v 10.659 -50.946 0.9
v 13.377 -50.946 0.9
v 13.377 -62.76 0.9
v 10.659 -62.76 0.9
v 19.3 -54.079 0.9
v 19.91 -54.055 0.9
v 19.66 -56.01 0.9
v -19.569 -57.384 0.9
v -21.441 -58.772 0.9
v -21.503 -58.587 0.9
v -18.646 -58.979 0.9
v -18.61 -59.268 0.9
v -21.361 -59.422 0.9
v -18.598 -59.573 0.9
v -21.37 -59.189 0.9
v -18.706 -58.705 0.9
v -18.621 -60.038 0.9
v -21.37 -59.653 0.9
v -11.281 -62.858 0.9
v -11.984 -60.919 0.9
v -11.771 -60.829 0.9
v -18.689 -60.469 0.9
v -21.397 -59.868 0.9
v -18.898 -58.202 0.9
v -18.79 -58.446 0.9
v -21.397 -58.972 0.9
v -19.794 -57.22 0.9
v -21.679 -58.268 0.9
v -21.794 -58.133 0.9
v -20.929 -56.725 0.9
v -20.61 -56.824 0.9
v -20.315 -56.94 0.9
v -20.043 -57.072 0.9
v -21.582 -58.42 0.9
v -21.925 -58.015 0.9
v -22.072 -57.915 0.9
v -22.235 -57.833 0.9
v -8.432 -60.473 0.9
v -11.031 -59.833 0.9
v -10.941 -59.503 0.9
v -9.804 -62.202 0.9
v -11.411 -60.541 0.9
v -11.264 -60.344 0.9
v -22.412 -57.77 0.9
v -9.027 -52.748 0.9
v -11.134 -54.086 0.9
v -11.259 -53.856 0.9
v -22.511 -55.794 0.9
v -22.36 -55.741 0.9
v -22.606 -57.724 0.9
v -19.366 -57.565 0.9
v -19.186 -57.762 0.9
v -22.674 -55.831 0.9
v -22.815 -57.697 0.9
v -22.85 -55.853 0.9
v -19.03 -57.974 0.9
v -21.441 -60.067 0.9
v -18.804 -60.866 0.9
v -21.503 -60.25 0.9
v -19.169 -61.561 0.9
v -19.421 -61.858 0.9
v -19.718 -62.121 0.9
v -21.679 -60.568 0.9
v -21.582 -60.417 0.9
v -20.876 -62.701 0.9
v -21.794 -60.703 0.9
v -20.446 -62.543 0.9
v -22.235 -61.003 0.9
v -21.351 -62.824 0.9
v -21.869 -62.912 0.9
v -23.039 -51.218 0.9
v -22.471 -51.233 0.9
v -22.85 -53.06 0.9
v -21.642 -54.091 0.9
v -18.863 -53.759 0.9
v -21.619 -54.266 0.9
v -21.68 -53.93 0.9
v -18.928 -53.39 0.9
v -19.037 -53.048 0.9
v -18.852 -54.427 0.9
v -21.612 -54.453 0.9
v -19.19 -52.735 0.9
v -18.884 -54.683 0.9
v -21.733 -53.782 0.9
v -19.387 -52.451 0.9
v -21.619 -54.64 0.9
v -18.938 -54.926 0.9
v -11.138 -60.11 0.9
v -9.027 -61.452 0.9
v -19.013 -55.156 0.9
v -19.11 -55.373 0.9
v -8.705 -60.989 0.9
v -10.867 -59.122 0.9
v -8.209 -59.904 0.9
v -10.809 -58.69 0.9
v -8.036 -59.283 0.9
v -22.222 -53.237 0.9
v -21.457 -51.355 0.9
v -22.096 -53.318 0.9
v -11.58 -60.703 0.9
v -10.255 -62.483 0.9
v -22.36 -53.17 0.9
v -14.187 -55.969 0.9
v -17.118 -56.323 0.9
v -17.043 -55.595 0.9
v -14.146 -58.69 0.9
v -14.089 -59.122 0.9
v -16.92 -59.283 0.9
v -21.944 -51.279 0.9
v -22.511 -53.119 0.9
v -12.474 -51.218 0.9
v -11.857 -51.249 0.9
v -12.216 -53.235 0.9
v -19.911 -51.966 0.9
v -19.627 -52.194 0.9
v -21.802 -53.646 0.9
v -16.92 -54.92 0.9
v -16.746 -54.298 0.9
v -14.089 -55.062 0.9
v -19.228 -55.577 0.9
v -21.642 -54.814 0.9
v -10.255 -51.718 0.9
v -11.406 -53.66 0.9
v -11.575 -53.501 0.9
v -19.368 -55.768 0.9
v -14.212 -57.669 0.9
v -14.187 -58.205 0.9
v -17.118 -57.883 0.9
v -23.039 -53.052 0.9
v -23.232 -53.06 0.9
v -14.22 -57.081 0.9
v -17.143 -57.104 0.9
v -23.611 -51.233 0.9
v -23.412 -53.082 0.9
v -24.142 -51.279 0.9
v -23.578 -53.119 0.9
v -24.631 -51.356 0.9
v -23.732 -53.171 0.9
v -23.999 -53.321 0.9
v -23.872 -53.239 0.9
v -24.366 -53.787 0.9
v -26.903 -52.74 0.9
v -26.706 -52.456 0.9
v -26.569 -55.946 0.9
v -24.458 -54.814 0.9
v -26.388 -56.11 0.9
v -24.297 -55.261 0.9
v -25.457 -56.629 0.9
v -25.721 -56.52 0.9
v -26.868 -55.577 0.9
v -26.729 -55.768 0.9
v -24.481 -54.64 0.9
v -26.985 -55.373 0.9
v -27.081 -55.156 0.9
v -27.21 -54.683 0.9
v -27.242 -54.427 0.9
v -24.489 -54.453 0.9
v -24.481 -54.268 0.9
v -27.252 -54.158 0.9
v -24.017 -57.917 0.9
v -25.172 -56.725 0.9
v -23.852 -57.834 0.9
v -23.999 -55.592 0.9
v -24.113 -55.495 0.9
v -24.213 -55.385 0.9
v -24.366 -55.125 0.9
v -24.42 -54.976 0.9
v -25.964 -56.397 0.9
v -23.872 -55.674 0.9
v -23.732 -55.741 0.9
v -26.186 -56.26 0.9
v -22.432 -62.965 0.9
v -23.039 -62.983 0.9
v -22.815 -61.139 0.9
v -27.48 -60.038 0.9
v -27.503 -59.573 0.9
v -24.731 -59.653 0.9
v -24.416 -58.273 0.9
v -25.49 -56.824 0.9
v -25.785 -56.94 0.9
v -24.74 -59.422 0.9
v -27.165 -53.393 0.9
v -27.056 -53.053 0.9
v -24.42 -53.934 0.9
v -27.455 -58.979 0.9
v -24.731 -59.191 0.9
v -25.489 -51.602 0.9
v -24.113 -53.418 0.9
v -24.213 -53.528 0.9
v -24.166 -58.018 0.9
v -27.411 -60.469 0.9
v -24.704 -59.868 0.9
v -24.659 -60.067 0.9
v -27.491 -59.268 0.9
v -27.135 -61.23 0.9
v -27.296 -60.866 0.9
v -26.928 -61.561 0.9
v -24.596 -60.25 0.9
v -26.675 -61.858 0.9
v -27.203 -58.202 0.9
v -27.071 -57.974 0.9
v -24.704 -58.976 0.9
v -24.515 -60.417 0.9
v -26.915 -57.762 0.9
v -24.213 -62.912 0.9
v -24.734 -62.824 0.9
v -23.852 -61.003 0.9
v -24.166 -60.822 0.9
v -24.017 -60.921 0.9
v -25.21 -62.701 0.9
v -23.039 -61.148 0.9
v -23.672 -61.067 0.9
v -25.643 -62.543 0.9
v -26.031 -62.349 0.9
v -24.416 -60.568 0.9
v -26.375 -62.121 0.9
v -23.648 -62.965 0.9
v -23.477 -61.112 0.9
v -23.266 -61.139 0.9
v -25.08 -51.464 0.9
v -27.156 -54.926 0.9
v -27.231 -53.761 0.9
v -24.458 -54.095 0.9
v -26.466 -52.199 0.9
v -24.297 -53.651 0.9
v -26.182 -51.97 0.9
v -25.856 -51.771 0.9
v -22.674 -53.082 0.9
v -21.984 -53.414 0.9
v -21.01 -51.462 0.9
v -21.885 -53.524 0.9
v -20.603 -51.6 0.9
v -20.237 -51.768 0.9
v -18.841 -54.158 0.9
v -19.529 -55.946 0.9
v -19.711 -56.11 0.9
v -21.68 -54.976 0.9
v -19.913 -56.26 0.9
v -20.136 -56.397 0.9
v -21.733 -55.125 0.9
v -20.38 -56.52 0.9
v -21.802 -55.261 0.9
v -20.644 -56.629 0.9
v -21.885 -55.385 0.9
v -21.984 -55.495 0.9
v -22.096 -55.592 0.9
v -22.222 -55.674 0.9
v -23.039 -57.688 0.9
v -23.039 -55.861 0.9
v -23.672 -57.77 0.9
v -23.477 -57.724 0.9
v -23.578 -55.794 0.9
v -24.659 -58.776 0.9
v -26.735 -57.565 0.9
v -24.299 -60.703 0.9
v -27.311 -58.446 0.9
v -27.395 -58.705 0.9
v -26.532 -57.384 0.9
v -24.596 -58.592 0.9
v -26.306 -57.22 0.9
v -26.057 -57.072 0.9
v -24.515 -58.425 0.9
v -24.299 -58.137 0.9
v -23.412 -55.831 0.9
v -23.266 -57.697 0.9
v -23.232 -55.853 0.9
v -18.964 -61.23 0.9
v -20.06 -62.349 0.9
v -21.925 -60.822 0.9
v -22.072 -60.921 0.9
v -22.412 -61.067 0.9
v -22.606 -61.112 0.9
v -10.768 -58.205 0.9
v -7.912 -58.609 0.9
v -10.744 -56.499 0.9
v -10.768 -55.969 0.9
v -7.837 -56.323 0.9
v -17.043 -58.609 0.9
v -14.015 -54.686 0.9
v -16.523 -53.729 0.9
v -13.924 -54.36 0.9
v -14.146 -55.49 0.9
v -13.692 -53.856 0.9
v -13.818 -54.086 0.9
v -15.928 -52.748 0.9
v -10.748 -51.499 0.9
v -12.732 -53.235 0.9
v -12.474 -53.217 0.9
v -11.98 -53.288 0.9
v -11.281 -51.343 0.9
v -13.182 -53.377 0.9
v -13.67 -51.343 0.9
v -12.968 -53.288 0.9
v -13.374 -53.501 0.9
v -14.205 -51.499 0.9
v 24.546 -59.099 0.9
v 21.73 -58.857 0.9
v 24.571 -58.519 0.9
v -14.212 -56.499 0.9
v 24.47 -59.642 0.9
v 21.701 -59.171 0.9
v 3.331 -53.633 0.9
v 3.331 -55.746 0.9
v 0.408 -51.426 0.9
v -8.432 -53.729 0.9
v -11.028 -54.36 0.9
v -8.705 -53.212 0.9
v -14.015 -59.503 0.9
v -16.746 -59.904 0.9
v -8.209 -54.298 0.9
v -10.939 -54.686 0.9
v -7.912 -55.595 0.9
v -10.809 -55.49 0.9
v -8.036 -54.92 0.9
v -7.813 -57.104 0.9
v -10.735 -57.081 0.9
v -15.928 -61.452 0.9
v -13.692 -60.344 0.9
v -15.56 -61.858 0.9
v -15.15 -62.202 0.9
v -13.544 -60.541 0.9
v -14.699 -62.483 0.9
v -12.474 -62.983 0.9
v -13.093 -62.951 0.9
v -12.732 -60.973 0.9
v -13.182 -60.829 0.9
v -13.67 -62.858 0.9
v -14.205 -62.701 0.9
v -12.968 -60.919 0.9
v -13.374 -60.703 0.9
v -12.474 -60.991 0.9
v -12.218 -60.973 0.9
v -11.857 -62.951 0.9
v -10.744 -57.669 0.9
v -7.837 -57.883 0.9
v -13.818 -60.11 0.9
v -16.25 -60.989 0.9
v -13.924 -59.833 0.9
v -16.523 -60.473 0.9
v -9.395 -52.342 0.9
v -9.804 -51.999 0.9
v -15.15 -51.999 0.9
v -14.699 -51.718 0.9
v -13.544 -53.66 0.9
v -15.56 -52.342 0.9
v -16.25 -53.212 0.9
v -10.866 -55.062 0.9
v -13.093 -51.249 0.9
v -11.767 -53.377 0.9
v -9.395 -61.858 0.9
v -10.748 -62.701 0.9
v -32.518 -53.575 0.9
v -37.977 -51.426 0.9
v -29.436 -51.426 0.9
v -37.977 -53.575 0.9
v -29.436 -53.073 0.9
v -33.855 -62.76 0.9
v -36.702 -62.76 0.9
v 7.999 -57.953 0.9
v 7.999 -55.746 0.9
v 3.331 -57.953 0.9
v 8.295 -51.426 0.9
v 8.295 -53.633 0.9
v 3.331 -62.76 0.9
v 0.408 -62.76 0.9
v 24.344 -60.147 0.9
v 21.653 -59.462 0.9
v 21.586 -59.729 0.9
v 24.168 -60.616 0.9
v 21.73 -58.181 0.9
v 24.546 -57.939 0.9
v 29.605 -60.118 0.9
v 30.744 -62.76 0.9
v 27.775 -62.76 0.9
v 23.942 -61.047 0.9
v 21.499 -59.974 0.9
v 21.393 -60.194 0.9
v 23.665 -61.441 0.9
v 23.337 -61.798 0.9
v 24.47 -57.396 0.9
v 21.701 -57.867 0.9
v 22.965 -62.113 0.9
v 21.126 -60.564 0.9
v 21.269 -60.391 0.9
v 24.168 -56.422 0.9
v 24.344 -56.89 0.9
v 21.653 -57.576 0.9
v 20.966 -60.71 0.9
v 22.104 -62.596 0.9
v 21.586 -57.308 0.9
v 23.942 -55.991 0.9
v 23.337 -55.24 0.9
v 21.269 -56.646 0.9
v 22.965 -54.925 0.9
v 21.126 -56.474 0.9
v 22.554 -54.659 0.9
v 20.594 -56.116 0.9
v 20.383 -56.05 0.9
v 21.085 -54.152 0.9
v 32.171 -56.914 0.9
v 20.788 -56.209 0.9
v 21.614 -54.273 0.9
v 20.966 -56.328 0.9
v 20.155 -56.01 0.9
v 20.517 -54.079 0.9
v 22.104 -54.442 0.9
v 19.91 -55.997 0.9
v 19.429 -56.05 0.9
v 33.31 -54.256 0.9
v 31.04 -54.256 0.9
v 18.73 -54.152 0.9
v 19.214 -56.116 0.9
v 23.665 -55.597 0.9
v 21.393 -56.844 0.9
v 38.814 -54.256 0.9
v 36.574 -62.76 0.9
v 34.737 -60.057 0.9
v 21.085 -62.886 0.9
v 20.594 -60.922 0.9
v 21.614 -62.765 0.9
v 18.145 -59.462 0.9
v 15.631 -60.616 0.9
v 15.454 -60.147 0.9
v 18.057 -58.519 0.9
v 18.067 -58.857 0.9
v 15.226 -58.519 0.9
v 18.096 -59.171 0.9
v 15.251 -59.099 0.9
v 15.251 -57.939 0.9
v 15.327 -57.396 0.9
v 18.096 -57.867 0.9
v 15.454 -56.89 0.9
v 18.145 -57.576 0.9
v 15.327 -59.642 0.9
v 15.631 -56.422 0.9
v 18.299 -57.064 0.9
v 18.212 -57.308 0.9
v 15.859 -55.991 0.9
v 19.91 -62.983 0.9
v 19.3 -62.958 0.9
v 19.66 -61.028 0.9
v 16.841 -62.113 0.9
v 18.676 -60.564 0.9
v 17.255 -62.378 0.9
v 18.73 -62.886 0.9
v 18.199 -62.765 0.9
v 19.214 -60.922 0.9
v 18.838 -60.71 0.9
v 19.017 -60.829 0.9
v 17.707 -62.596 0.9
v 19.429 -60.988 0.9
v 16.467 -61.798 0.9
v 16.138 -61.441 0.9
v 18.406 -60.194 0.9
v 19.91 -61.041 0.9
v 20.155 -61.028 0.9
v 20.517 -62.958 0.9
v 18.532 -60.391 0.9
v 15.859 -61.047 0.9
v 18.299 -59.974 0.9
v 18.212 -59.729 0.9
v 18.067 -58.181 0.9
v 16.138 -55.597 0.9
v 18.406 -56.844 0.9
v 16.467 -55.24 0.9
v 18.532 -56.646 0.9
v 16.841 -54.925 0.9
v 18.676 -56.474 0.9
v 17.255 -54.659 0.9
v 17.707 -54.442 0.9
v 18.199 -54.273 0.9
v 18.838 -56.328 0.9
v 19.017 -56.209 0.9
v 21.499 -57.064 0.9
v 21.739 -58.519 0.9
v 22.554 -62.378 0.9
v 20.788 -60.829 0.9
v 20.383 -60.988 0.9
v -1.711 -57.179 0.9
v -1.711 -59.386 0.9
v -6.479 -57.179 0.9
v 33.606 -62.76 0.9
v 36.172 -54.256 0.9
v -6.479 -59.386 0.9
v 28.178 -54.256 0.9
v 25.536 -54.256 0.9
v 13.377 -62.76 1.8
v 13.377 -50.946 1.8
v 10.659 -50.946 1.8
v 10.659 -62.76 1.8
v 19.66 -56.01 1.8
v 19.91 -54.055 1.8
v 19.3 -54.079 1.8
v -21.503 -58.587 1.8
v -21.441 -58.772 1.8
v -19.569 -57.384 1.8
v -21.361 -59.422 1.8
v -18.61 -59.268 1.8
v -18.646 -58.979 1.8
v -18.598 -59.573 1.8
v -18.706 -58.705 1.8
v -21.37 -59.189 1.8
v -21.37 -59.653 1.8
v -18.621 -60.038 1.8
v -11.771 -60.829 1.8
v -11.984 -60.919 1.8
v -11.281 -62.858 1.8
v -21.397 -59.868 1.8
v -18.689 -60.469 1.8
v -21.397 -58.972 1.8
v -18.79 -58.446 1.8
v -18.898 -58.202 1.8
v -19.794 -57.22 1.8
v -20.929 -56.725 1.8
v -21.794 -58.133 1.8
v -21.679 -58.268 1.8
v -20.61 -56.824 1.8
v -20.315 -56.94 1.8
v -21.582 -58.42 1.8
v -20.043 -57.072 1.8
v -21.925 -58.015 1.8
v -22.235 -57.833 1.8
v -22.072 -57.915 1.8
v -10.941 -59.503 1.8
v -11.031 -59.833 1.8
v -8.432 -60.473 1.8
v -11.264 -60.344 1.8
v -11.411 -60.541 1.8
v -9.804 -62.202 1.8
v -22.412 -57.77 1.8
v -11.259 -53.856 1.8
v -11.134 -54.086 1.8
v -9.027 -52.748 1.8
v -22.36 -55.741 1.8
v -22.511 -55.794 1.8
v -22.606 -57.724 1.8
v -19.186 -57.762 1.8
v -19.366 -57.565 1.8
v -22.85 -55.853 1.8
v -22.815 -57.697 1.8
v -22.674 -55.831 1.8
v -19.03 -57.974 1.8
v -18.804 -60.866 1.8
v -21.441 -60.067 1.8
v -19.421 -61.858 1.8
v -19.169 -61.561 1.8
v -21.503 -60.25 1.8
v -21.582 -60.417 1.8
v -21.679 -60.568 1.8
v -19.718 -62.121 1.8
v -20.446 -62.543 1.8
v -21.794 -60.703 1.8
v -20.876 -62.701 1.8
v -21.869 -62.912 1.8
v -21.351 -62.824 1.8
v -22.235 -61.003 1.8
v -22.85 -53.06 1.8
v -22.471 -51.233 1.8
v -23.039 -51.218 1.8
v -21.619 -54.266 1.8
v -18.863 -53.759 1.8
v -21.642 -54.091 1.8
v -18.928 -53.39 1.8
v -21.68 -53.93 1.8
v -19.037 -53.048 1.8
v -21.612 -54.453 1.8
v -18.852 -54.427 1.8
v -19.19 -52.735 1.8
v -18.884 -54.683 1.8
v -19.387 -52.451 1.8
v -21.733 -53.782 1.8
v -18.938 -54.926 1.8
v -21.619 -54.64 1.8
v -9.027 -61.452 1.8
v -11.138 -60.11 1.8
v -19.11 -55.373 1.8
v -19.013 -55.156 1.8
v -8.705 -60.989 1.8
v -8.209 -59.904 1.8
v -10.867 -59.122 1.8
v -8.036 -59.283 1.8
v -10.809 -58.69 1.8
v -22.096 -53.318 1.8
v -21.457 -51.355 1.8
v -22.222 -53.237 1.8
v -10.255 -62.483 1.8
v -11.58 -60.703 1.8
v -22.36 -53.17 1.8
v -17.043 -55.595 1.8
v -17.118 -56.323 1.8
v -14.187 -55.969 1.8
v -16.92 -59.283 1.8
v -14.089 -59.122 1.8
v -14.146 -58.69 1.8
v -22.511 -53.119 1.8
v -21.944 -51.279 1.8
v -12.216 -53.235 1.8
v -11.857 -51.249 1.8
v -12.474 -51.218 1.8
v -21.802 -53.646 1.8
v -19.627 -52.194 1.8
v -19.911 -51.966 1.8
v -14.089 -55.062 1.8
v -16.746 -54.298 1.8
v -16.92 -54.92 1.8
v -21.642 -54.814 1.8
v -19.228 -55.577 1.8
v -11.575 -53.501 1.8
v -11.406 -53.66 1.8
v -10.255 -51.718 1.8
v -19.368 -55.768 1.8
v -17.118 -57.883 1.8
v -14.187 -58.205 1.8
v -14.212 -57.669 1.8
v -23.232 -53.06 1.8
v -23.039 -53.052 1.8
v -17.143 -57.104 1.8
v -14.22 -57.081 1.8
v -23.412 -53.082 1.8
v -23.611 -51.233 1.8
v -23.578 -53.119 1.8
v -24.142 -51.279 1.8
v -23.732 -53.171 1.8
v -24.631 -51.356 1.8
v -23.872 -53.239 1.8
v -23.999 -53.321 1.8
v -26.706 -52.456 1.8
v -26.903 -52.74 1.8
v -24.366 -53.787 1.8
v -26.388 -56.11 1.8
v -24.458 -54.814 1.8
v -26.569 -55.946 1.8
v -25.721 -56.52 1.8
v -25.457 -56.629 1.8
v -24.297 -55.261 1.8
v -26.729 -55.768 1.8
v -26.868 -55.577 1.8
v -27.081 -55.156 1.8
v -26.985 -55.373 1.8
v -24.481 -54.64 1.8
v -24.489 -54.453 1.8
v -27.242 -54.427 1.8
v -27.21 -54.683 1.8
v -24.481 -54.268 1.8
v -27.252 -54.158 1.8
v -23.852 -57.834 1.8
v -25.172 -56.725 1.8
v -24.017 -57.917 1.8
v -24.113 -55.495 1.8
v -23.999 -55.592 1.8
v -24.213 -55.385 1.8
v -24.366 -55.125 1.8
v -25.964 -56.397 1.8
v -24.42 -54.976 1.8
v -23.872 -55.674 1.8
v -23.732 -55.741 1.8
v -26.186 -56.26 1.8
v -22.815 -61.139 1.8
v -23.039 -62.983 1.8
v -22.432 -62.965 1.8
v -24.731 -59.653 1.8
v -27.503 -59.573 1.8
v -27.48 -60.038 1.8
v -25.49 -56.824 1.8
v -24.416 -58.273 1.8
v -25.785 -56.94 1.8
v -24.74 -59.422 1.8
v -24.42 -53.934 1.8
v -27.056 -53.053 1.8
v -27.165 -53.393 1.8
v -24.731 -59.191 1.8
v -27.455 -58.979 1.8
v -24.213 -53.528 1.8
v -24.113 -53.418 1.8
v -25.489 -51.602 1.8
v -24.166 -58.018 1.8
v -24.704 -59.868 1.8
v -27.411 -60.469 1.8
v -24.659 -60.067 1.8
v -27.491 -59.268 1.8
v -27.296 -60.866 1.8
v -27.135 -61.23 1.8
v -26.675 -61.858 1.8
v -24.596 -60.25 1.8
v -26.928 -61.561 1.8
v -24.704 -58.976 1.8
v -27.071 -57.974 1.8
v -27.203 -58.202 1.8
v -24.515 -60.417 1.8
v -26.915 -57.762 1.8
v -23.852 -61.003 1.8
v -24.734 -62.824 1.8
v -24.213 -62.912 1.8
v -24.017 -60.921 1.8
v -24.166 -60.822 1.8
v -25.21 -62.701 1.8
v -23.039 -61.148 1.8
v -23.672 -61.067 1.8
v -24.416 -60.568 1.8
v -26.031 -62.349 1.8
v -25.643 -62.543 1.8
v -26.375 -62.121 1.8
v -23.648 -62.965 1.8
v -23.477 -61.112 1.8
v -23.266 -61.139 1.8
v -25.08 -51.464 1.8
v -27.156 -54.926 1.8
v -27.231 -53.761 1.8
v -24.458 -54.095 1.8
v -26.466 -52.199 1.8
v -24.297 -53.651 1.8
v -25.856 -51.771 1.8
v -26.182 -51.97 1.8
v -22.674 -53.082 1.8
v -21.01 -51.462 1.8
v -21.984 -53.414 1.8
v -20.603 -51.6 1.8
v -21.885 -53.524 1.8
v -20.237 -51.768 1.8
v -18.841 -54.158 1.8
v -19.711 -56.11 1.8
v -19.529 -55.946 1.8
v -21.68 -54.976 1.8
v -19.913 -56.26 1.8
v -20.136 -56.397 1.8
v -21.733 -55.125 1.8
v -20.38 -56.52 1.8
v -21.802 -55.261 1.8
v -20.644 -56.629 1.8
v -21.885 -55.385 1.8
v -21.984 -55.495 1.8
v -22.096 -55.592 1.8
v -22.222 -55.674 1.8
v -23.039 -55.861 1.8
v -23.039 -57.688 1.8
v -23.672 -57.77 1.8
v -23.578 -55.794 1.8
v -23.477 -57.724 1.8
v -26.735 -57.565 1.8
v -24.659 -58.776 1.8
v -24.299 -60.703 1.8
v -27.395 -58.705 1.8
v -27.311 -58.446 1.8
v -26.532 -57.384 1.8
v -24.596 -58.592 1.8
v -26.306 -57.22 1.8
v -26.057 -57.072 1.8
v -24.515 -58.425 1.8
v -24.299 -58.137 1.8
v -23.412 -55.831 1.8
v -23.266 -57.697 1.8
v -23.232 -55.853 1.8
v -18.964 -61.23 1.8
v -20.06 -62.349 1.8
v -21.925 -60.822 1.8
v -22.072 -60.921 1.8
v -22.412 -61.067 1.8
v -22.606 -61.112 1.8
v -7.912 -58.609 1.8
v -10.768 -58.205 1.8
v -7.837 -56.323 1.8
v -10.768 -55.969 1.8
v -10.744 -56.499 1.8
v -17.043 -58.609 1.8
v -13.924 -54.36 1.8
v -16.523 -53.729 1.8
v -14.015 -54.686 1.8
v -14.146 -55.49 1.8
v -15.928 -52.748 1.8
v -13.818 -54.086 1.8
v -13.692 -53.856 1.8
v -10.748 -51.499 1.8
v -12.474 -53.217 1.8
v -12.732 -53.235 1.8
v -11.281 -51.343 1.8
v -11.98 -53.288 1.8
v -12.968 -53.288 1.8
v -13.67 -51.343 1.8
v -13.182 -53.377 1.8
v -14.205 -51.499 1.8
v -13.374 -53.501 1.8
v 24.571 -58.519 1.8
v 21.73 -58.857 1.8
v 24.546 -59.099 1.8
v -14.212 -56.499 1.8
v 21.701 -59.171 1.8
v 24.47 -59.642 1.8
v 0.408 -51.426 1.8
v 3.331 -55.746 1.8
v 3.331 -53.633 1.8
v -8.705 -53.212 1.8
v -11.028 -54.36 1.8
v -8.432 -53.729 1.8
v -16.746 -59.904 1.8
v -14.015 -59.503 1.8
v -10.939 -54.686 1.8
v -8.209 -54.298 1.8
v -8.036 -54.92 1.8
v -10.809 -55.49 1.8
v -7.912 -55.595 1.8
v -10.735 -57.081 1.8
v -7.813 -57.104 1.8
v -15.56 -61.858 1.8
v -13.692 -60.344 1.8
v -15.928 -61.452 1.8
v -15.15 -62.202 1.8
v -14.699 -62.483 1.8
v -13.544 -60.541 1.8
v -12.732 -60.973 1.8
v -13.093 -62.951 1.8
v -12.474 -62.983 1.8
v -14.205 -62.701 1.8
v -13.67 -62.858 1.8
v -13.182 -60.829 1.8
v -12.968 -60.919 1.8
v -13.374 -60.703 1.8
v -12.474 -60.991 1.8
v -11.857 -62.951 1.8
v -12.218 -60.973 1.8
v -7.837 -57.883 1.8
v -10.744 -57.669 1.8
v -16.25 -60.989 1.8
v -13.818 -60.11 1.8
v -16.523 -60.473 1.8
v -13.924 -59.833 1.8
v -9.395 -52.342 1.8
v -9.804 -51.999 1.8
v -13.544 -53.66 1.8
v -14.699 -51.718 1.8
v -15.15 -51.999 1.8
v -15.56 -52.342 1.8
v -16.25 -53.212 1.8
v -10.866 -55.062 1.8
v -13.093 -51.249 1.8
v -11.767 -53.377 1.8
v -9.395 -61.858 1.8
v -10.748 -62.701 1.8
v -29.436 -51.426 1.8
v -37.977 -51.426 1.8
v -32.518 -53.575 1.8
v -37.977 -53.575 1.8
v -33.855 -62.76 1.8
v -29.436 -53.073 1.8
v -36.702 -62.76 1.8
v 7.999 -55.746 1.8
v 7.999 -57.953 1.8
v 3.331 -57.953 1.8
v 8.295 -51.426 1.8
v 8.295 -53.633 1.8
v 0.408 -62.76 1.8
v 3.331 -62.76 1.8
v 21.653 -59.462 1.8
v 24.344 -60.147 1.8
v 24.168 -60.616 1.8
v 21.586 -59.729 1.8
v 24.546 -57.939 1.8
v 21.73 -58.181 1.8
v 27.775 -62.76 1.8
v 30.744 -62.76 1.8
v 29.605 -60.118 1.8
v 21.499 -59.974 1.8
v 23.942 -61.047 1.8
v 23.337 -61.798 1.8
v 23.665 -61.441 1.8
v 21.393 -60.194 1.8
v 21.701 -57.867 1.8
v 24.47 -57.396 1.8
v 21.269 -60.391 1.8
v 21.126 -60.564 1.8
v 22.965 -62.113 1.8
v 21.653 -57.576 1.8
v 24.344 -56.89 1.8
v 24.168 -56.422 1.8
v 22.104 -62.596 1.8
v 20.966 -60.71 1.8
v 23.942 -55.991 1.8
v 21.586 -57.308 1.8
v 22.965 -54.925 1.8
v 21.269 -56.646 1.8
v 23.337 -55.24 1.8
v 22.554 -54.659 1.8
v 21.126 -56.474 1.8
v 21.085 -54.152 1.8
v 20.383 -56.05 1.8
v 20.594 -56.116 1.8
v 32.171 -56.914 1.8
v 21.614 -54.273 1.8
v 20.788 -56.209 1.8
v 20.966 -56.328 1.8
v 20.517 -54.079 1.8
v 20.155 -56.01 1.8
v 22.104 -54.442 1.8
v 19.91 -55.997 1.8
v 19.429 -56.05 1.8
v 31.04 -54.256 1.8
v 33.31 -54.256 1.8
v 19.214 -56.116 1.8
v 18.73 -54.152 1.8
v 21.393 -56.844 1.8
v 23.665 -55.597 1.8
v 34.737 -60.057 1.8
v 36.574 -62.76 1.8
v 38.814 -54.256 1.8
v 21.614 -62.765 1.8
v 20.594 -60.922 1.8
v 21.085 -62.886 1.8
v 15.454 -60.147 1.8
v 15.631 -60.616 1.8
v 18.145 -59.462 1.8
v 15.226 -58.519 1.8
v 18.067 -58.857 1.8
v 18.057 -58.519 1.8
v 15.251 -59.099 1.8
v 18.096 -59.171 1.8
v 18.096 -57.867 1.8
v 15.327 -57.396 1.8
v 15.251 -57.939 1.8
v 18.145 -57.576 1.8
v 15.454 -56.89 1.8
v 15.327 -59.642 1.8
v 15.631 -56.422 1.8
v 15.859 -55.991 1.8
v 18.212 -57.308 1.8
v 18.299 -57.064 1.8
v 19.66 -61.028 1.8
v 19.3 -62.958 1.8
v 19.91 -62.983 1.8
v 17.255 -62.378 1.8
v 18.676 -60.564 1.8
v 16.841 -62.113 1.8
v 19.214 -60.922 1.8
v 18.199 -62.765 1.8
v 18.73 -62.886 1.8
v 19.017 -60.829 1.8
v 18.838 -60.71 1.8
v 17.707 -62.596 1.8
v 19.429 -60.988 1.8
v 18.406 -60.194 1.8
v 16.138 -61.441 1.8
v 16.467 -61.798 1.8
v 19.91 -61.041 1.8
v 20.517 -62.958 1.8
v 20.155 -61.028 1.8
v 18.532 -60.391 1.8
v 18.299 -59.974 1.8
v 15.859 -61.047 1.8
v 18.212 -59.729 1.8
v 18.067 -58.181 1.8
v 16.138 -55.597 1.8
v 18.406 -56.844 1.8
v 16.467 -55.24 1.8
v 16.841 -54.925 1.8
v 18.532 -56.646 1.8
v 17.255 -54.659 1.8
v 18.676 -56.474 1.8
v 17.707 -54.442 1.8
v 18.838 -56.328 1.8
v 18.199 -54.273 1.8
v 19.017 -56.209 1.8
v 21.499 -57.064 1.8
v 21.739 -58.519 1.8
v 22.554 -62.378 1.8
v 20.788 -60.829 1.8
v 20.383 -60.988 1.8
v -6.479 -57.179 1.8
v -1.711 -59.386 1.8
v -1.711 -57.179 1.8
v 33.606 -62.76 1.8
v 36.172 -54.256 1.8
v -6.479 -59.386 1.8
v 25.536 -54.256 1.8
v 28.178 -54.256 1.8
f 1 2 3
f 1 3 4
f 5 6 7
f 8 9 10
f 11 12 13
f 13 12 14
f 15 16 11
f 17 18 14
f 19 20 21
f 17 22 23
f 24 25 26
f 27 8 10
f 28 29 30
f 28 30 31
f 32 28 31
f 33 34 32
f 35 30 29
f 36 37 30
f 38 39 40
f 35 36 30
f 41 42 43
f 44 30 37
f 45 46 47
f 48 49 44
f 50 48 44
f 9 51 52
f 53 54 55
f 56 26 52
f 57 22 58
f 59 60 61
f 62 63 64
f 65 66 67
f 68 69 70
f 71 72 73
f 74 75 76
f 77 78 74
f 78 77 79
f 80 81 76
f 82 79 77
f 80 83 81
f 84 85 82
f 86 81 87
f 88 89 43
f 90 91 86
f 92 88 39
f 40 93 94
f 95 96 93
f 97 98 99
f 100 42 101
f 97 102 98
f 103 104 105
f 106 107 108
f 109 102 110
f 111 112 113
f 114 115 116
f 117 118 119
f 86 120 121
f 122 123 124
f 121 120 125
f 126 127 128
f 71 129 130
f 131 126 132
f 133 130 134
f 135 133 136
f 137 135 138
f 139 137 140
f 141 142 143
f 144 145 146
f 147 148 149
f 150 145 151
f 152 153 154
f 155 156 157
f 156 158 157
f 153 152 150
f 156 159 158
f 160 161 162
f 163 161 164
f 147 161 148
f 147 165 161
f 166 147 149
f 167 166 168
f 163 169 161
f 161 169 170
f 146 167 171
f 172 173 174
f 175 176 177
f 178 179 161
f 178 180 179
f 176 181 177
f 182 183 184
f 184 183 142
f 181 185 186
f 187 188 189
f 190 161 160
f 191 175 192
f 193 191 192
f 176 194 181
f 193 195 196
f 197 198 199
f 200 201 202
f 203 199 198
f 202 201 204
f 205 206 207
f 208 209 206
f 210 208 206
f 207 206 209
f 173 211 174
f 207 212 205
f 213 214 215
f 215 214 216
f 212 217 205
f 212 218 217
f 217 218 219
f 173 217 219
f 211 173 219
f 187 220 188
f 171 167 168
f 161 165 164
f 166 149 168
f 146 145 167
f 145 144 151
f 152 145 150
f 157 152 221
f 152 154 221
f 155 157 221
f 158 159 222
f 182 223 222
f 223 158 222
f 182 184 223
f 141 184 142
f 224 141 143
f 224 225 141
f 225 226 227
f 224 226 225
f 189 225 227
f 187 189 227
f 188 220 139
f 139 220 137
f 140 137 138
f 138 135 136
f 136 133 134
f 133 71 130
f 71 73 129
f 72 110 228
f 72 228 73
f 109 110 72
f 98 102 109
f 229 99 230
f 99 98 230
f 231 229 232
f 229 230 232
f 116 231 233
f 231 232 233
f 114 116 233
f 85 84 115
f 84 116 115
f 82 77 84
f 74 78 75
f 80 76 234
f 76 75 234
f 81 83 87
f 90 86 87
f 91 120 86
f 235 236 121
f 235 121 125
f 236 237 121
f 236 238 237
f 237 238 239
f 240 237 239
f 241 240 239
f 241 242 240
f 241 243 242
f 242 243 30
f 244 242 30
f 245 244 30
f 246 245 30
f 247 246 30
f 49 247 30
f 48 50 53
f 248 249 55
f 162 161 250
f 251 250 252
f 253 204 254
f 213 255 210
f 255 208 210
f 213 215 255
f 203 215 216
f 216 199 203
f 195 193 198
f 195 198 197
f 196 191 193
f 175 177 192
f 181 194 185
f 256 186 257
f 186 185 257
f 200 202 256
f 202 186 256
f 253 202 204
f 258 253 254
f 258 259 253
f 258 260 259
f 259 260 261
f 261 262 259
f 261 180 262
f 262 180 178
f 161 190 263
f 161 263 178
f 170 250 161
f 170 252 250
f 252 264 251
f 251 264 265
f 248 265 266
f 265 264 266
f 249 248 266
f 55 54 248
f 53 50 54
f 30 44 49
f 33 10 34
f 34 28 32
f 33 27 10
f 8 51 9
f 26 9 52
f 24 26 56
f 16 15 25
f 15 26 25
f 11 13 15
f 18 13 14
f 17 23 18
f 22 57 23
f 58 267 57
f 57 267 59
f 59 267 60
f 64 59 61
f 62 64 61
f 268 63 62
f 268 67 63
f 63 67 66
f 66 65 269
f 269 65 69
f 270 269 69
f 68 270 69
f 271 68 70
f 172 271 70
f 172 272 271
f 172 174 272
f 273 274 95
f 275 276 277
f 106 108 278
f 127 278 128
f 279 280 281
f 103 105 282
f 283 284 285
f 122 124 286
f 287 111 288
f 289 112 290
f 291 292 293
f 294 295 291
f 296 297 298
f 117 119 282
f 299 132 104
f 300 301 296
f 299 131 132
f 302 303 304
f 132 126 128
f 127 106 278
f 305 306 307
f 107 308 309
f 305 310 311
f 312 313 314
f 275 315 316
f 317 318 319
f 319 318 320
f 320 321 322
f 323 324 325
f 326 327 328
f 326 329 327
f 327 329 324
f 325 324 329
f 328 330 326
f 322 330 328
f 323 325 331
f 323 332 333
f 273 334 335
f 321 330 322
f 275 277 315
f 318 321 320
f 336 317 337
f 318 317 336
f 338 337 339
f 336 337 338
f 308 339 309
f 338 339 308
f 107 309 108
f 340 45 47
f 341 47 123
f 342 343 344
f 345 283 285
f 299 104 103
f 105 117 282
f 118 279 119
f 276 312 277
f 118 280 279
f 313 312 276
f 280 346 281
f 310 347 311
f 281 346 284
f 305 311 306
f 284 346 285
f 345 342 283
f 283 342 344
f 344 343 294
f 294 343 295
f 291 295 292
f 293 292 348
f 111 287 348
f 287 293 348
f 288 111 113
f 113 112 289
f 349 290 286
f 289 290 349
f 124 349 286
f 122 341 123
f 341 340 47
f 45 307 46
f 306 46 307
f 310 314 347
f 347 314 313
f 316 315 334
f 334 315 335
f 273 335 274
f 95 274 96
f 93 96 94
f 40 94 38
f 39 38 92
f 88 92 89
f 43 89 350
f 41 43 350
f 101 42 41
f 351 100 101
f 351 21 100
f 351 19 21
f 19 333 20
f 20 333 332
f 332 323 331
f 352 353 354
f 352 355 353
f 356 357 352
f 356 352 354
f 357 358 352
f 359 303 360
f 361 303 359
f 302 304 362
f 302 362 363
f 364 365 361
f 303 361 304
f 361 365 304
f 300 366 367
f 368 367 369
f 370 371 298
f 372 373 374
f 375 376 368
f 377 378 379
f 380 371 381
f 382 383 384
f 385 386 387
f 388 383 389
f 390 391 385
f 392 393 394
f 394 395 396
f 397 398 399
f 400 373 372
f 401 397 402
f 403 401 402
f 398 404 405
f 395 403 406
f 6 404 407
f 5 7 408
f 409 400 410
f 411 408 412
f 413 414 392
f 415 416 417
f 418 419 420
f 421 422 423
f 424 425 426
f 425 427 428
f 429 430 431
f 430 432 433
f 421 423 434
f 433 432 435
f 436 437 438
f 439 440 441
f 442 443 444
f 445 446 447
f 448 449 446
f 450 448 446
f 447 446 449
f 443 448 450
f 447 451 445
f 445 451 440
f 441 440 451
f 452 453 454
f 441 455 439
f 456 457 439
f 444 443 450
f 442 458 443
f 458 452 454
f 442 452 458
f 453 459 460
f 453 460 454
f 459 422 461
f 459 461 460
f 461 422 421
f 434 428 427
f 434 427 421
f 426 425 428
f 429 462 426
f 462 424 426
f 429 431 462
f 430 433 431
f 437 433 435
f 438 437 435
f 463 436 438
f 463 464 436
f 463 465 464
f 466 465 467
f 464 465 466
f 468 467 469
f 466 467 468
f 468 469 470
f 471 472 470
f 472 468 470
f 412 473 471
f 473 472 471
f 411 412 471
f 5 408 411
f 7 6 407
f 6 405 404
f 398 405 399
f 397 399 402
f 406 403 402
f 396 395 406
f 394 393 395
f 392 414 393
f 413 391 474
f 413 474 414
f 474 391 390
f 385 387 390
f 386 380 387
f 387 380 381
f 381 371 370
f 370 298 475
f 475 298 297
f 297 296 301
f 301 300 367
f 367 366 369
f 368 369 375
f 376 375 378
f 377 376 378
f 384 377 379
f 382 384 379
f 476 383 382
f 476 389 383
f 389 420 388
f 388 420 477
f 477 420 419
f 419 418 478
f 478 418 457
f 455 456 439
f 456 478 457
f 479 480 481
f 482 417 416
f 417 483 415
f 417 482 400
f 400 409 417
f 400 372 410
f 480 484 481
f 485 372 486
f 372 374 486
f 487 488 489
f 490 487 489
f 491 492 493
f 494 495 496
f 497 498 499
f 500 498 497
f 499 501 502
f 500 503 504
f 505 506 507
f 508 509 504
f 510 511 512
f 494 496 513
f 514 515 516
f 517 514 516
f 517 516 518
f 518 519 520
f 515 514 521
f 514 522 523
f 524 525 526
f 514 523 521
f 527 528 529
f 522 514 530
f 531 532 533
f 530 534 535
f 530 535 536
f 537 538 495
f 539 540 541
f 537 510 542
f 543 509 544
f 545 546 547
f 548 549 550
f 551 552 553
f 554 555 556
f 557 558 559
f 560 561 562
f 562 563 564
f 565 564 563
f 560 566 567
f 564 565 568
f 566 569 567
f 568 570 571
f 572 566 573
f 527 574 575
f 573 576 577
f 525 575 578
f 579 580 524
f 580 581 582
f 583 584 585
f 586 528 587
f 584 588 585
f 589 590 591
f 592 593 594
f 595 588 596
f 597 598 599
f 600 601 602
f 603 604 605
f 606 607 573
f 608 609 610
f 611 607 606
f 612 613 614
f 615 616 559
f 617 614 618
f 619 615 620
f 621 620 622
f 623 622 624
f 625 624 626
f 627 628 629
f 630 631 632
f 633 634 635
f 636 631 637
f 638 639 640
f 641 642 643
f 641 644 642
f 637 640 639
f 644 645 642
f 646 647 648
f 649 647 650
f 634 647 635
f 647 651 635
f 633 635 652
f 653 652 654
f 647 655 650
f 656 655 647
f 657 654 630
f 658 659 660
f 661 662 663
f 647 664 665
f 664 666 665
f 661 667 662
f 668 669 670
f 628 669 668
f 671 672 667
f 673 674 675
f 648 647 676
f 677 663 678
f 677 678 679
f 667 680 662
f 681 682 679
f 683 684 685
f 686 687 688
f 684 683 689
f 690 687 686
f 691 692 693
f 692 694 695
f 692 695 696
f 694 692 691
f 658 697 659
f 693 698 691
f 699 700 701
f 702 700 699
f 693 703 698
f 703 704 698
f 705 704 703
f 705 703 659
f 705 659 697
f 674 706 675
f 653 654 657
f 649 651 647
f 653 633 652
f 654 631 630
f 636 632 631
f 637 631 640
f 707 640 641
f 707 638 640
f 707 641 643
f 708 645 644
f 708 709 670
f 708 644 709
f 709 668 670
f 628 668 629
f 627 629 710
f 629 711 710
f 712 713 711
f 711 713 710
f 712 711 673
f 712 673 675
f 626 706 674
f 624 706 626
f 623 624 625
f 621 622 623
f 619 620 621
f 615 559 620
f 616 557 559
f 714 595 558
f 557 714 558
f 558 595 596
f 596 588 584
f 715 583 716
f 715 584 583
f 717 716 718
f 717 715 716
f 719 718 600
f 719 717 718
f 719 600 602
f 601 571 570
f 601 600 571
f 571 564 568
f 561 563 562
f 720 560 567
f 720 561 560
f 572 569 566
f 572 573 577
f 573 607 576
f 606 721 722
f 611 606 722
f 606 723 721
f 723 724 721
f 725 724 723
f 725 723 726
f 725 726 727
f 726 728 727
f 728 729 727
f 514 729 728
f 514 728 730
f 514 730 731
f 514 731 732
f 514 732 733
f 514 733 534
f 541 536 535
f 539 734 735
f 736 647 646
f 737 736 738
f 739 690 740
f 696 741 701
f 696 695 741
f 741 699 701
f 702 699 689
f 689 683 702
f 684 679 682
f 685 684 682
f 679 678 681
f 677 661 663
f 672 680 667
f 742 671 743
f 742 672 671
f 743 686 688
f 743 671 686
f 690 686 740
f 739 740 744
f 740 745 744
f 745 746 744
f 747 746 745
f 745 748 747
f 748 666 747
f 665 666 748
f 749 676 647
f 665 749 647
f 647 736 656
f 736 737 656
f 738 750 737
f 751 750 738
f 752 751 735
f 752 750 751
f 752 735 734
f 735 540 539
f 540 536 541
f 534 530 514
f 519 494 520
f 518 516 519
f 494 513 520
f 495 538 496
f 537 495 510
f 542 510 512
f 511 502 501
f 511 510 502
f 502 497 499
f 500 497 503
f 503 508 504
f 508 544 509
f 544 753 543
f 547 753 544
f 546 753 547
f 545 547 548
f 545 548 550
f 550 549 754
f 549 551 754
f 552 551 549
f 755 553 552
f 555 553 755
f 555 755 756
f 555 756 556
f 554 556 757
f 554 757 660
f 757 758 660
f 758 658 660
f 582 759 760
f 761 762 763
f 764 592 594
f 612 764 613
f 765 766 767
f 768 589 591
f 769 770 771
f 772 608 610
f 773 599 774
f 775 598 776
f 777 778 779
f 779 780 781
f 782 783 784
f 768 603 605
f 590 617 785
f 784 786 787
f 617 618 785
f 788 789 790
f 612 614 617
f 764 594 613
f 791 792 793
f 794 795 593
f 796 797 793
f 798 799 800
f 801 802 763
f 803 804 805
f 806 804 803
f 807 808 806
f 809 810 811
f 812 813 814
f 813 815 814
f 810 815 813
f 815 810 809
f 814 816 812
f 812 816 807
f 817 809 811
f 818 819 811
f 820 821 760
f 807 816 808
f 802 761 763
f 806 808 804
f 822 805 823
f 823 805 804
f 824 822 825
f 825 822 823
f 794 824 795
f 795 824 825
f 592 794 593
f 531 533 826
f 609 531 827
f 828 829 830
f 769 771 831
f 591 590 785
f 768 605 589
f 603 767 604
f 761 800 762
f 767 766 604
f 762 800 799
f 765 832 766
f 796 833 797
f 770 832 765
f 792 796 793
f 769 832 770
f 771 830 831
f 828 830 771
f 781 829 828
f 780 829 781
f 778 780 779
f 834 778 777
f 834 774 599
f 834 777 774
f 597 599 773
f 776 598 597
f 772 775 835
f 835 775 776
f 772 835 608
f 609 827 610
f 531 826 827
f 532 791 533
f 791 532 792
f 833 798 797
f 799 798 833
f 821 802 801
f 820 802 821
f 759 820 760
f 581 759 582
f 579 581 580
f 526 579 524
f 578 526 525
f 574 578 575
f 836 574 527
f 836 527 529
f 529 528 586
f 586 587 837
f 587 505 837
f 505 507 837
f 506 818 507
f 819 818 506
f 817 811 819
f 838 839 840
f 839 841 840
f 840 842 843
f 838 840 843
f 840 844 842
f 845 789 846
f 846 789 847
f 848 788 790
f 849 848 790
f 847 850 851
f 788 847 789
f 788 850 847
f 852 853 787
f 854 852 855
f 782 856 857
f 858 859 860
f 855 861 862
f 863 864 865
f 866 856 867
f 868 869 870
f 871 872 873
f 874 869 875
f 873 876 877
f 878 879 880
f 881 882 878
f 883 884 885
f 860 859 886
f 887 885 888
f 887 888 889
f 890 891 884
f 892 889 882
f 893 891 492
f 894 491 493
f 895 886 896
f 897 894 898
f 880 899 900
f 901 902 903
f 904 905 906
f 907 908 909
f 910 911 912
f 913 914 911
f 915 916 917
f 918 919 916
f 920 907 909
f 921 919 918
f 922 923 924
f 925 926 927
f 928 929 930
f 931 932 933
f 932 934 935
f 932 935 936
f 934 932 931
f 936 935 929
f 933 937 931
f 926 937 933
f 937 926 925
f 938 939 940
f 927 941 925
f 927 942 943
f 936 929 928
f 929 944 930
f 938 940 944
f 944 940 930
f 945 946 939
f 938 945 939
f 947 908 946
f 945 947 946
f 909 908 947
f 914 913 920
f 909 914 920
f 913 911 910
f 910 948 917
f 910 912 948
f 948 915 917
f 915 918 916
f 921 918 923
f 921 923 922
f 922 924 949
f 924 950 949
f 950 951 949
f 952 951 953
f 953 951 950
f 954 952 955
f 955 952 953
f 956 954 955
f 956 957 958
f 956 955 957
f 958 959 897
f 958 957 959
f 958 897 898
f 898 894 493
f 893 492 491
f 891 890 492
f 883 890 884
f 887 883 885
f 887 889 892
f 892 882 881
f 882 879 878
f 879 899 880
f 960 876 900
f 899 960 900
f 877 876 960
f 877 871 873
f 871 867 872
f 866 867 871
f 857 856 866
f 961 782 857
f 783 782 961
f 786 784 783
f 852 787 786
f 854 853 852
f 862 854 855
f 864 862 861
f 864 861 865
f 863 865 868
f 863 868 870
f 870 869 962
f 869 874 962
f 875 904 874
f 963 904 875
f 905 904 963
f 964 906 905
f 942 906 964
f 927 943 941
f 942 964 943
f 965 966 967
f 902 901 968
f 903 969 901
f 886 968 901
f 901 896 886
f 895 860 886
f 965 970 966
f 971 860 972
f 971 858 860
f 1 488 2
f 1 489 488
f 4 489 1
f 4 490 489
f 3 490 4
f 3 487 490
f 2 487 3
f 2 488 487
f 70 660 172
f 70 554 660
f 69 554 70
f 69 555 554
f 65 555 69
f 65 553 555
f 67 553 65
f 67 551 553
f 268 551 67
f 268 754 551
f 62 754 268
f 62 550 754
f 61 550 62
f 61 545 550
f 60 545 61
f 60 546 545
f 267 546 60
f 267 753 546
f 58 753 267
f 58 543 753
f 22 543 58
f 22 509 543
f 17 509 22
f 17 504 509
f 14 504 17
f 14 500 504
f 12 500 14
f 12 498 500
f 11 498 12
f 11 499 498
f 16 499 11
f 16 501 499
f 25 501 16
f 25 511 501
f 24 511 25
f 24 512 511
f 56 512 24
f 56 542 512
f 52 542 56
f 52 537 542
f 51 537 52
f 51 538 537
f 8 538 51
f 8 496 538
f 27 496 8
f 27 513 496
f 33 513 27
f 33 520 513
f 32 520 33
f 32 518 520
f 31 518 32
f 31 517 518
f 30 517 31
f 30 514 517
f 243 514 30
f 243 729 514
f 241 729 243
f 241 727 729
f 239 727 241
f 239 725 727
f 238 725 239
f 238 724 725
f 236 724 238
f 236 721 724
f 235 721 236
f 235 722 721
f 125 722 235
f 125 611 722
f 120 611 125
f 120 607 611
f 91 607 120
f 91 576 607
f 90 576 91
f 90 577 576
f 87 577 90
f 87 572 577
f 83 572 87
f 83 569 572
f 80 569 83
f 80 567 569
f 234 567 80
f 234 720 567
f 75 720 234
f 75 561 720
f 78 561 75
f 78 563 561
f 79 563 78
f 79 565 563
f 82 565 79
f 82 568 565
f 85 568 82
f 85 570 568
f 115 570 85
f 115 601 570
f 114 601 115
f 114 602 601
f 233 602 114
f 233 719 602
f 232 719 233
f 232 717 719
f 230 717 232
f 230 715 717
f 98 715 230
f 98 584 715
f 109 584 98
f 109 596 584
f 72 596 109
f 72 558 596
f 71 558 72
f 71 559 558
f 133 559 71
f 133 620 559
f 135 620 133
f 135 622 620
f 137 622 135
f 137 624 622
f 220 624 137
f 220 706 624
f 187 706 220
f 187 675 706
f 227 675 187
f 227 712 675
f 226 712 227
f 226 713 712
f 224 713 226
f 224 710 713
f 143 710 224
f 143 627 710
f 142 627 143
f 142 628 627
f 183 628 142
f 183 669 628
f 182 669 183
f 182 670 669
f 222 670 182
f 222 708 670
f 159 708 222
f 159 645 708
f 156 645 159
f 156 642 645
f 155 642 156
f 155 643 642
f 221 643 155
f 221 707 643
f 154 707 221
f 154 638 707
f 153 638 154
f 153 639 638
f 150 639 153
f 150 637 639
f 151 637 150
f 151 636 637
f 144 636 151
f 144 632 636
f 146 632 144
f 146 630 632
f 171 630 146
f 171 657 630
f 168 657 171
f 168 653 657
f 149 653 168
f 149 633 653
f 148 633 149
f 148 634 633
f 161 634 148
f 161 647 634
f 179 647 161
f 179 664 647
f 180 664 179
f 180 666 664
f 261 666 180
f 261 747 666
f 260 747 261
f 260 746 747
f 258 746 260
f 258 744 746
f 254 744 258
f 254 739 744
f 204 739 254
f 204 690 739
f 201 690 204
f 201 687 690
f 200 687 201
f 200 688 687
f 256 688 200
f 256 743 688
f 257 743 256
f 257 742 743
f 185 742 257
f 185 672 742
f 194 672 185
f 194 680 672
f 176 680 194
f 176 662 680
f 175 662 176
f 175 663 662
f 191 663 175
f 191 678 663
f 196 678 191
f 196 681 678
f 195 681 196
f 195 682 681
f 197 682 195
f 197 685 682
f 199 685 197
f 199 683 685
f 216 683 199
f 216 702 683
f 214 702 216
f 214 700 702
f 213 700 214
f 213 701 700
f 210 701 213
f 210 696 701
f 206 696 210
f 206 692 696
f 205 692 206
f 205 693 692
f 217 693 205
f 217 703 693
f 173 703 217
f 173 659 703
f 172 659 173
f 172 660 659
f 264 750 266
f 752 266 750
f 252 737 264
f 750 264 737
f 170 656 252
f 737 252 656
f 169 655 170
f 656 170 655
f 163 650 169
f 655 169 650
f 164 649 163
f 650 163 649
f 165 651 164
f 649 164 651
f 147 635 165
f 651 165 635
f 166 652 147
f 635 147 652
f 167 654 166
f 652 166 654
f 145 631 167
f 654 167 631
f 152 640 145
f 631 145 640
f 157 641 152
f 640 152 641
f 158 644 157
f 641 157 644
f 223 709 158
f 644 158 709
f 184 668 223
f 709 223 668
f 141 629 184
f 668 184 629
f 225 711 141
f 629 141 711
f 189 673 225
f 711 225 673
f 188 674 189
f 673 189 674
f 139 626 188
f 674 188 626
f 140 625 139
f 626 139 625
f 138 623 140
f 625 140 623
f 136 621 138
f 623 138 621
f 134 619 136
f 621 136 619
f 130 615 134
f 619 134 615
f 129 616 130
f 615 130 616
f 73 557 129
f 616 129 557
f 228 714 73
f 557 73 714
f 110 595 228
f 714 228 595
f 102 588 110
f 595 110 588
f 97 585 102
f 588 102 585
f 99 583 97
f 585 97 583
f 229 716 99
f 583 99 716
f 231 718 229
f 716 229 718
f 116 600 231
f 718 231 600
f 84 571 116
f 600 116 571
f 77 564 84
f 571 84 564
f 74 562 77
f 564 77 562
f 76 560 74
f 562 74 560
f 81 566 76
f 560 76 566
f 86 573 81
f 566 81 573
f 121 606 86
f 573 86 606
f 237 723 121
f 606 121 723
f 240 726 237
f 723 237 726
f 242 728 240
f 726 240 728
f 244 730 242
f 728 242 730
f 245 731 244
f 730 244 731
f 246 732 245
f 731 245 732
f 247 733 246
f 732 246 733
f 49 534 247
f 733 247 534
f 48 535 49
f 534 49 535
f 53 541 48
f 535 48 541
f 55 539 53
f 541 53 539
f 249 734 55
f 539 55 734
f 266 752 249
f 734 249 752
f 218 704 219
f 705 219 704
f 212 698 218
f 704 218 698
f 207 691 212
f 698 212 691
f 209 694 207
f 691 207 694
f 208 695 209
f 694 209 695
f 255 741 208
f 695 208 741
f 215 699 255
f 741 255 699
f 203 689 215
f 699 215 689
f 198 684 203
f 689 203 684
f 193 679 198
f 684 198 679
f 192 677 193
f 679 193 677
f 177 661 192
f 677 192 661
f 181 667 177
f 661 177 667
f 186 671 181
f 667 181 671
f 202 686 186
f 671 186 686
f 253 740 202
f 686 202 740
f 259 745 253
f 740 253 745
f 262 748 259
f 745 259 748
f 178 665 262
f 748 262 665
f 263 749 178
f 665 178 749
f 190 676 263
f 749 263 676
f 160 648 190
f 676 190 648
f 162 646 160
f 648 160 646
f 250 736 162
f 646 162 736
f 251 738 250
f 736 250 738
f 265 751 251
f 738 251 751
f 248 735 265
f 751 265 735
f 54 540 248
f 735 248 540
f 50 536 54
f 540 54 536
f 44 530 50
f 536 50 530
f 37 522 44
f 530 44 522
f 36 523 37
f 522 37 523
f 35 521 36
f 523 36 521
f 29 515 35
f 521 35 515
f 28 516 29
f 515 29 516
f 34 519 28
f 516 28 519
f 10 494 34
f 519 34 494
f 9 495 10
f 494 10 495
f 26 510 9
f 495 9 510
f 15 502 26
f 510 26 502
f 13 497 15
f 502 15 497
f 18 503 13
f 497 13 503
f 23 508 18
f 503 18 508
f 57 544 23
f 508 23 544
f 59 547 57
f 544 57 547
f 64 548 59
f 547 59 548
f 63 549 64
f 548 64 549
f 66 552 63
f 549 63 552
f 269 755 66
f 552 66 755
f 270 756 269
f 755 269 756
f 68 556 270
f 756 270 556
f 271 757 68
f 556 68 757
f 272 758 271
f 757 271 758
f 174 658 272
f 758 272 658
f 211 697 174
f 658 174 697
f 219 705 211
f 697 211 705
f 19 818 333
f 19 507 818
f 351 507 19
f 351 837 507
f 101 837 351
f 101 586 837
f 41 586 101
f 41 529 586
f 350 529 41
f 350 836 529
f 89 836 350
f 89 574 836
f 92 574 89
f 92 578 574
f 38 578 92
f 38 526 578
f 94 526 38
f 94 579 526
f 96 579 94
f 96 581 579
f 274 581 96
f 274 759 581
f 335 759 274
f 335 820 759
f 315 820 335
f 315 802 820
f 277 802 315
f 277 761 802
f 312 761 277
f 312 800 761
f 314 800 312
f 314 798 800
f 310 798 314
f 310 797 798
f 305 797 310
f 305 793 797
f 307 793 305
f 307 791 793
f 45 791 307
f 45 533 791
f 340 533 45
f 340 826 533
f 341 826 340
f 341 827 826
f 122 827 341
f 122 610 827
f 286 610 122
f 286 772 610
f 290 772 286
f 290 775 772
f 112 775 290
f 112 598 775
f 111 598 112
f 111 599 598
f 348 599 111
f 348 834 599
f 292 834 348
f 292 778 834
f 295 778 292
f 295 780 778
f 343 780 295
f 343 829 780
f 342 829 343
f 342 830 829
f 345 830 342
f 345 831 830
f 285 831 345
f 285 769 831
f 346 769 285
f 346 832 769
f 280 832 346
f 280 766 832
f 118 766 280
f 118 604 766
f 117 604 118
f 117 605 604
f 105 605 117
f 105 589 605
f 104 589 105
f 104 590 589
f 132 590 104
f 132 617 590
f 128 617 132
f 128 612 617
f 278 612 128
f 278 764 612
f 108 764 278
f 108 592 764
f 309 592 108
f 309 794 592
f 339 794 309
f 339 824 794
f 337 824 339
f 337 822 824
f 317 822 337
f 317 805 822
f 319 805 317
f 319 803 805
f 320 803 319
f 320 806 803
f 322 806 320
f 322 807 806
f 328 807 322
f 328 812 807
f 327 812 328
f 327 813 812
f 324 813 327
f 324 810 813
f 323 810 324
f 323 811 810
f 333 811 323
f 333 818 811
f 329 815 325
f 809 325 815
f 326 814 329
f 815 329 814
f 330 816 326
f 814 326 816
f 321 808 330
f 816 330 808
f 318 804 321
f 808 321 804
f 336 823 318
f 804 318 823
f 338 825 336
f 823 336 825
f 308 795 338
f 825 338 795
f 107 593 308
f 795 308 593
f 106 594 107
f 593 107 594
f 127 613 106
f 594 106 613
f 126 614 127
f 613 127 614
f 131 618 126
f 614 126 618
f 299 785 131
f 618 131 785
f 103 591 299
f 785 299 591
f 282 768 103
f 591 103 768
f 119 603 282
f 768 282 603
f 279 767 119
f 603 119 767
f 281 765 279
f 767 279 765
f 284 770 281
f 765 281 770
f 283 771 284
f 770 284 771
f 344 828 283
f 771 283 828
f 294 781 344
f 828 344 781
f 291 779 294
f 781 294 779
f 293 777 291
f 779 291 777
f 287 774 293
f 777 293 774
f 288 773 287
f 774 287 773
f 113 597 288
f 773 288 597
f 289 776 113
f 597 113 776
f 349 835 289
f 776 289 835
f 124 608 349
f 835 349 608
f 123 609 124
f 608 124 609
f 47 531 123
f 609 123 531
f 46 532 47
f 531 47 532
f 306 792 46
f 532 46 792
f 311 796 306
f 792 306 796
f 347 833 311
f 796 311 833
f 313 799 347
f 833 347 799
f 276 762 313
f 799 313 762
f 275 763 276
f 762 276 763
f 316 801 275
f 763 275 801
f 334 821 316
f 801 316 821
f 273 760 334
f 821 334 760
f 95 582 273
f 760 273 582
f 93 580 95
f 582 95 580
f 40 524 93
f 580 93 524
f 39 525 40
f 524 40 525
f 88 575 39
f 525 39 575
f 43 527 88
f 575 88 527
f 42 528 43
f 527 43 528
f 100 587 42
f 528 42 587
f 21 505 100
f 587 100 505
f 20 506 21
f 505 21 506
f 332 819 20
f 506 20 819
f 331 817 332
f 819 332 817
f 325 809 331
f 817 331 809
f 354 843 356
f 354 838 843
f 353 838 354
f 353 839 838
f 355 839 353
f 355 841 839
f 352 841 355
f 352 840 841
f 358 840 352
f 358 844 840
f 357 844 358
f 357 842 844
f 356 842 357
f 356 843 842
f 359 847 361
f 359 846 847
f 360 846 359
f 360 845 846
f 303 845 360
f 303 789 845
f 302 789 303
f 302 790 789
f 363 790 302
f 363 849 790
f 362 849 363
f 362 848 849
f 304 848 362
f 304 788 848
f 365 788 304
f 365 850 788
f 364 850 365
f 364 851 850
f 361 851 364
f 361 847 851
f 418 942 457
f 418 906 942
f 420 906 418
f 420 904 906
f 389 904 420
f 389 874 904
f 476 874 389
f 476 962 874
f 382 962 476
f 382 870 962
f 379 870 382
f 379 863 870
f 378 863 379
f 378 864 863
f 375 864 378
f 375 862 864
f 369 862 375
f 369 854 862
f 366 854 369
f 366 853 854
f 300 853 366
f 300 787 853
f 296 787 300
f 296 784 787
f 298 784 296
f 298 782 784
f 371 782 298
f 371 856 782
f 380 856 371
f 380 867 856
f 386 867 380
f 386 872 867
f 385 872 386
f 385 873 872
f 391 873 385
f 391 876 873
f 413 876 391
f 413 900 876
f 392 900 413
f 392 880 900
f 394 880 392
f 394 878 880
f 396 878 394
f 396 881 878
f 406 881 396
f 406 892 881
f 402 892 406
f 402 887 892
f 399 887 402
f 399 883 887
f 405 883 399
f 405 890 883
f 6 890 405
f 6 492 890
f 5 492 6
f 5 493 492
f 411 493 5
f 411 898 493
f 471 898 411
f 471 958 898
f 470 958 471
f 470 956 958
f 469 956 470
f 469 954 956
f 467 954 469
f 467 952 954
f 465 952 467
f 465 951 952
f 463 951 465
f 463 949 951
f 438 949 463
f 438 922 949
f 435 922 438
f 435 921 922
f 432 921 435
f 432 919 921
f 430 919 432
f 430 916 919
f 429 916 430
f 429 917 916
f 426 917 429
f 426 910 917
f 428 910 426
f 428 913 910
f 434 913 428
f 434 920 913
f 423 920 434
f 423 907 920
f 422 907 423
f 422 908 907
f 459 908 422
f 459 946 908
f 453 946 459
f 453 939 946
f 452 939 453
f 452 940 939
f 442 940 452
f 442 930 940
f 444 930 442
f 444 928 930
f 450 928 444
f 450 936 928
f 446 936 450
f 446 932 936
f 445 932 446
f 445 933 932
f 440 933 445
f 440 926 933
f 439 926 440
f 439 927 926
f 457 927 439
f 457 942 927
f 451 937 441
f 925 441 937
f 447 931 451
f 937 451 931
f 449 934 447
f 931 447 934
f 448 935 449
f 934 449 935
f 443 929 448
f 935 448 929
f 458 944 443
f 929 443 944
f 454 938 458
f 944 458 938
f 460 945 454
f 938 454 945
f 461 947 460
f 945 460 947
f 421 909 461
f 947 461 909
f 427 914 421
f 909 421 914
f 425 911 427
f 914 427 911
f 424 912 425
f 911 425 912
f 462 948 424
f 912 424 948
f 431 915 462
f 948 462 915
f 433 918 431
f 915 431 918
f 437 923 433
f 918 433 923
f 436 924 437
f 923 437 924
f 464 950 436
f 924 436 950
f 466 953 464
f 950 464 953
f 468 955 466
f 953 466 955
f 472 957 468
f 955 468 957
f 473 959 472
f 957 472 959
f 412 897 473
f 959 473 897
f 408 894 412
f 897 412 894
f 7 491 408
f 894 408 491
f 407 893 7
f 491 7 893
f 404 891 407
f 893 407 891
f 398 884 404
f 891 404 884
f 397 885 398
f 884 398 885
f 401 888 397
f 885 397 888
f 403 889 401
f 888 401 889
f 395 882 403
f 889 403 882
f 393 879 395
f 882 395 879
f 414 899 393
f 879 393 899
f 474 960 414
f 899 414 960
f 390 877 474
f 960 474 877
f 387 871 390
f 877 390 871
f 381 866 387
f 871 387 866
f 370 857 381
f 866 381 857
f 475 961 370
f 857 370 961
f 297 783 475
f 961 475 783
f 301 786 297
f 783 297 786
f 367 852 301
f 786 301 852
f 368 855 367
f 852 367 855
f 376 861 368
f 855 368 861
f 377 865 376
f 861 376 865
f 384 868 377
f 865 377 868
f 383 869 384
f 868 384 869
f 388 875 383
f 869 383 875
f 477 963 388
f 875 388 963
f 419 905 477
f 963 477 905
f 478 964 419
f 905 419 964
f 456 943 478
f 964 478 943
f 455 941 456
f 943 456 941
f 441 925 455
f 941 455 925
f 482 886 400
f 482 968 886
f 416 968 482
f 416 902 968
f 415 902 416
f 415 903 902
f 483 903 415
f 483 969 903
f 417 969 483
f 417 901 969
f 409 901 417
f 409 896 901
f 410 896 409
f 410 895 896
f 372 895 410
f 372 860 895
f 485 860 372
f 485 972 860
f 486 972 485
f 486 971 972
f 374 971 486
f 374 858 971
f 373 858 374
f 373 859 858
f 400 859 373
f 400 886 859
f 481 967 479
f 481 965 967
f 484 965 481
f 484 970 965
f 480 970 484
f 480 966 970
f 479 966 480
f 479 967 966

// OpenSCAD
$fn = 48;
  // English (below bottom hole)
  translate([0, -57.100, 0.900]) linear_extrude(height=0.900) text("780-Flow", size=11.195, halign="center", valign="center", font="Helvetica Neue:style=Bold");
